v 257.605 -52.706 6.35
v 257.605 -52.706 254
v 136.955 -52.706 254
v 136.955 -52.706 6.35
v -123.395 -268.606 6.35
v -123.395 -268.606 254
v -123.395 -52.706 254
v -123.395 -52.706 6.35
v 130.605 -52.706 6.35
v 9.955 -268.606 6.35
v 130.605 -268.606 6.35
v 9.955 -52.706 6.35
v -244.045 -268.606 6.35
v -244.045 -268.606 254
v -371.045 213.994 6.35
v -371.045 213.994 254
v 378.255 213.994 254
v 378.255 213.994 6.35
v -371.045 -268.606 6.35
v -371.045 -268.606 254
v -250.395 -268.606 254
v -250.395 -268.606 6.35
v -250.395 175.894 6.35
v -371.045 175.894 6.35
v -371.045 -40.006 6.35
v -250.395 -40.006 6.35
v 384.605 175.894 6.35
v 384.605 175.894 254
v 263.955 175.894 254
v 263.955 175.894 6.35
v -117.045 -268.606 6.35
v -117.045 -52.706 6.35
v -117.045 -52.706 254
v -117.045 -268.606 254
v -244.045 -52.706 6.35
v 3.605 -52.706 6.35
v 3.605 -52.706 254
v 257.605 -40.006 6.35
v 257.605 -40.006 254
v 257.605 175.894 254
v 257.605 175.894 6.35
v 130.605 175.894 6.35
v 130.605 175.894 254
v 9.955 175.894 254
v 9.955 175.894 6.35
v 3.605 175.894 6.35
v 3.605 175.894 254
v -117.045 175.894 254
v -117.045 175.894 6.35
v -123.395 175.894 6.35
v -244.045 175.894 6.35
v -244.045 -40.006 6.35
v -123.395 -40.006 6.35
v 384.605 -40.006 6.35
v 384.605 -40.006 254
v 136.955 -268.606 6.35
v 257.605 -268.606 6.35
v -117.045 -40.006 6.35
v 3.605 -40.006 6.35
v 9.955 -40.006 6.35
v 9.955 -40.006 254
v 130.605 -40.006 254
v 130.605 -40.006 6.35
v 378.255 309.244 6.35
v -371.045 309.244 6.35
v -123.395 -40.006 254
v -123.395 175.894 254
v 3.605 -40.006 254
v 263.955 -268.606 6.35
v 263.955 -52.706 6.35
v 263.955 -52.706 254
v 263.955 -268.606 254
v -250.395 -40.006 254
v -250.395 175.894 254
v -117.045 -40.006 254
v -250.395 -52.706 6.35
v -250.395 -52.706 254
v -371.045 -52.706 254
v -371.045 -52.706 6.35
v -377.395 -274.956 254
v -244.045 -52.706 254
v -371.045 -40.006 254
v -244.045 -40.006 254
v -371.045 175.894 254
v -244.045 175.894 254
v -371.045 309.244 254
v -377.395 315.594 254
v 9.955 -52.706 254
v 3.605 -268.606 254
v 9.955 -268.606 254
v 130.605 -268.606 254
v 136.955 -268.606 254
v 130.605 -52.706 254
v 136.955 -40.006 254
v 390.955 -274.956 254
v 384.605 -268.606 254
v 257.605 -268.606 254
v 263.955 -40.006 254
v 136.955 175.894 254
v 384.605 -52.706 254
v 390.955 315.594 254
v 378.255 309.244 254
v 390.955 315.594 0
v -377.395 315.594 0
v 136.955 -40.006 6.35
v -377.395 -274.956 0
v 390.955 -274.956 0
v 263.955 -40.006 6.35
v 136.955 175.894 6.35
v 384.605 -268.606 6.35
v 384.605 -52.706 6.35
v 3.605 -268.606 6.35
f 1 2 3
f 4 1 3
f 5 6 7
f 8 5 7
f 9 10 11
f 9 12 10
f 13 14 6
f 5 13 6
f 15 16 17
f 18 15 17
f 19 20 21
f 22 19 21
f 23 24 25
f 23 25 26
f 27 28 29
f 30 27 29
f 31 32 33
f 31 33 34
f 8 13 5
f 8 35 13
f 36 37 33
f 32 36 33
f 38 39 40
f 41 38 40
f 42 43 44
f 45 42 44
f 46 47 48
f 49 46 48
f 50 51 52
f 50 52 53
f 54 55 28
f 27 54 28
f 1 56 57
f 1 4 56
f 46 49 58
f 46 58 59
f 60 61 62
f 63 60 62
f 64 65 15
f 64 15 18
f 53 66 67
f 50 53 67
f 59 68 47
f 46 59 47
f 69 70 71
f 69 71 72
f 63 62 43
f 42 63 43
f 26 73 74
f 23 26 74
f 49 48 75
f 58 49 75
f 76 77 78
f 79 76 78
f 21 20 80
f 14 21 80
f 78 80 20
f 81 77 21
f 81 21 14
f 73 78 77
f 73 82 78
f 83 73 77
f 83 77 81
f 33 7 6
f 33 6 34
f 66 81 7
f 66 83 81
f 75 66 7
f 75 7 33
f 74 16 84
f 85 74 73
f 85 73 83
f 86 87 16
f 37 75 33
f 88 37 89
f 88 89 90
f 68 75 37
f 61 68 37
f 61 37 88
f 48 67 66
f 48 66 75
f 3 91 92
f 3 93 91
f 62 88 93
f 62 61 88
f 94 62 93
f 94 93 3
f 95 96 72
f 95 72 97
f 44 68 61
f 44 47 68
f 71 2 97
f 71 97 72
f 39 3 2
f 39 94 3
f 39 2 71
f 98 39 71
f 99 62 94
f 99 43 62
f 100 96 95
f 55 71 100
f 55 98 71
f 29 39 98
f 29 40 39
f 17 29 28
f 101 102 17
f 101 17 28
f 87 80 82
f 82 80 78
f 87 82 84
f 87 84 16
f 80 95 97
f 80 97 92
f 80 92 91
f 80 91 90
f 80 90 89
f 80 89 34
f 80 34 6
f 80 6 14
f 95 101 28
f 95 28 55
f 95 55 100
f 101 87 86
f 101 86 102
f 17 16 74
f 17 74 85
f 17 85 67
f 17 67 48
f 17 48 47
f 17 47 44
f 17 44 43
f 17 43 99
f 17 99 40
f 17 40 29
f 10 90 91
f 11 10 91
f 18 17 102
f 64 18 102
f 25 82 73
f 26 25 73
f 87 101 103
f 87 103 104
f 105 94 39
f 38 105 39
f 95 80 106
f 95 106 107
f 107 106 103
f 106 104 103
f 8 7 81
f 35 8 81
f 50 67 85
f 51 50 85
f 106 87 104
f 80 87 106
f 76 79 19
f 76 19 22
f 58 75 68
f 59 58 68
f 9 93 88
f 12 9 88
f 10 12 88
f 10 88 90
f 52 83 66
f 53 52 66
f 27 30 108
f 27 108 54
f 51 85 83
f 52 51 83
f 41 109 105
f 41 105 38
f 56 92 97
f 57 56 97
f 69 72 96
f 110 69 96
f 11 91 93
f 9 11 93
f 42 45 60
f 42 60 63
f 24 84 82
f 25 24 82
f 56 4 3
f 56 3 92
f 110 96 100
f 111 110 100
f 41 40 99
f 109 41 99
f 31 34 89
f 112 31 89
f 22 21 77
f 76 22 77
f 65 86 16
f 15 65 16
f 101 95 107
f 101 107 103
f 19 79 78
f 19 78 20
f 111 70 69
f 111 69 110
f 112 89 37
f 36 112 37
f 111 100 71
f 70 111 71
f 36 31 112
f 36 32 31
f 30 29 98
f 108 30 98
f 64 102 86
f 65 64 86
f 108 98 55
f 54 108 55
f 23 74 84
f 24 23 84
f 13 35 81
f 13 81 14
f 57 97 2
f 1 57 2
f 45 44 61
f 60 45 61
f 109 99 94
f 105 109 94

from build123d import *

# Parameters (mm, degrees)
F0_W     = 762
F0_H     = 584.2
F1_DEPTH = 254
F3_DEPTH = 247.65
F5_DEPTH = 254
F6_DEPTH = 254
F7_DEPTH = 247.65


with BuildPart() as f1:
    # F0 (on Top) → F1 (new body)
    with BuildSketch(Plane.XY):
        with Locations((3.6051012576, 23.4938759938)):
            Rectangle(F0_W, F0_H)
    extrude(amount=F1_DEPTH)

    # F2 (on face) → F3 (cut)
    with BuildSketch(Plane.XY.offset(254)):
        Polygon((-371.0448987424, 309.2438759938), (-371.0448987424, 295.6585884094), (-371.0448987424, 213.9938759938), (378.2551012576, 213.9938759938), (378.2551012576, 277.7049839497), (378.2551012576, 309.2438759938), align=None)
    extrude(amount=-F3_DEPTH, mode=Mode.SUBTRACT)

    # F4 (on face) → F5 (join)
    with BuildSketch(Plane.XY.offset(254)):
        Polygon((384.6051012576, 315.5938759938), (384.6051012576, 175.8938759938), (384.6051012576, -40.0061240062), (384.6051012576, -52.7061240062), (384.6051012576, -268.6061240062), (390.9551012576, -268.6061240062), (390.9551012576, 315.5938759938), align=None)
    extrude(amount=-F5_DEPTH)

    # F4 (on face) → F6 (join)
    with BuildSketch(Plane.XY.offset(254)):
        Polygon((390.9551012576, -268.6061240062), (384.6051012576, -268.6061240062), (263.9551012576, -268.6061240062), (257.6051012576, -268.6061240062), (136.9551012576, -268.6061240062), (130.6051012576, -268.6061240062), (9.9551012576, -268.6061240062), (3.6051012576, -268.6061240062), (-117.0448987424, -268.6061240062), (-123.3948987424, -268.6061240062), (-244.0448987424, -268.6061240062), (-250.3948987424, -268.6061240062), (-371.0448987424, -268.6061240062), (-377.3948987424, -268.6061240062), (-377.3948987424, -274.9561240062), (390.9551012576, -274.9561240062), align=None)
    extrude(amount=-F6_DEPTH)

    # F4 (on face) → F7 (cut)
    with BuildSketch(Plane.XY.offset(254)):
        Polygon((-244.0448987424, -231.7013091296), (-244.0448987424, -268.6061240062), (-123.3948987424, -268.6061240062), (-123.3948987424, -229.8385000676), (-123.3948987424, -52.7061240062), (-244.0448987424, -52.7061240062), align=None)
        Polygon((-117.0448987424, -229.8385000676), (-117.0448987424, -268.6061240062), (3.6051012576, -268.6061240062), (3.6051012576, -232.6196825951), (3.6051012576, -52.7061240062), (-117.0448987424, -52.7061240062), align=None)
        Polygon((9.9551012576, -268.6061240062), (130.6051012576, -268.6061240062), (130.6051012576, -242.5831056088), (130.6051012576, -52.7061240062), (9.9551012576, -52.7061240062), (9.9551012576, -232.6196825951), align=None)
        Polygon((136.9551012576, -268.6061240062), (257.6051012576, -268.6061240062), (257.6051012576, -243.7552756518), (257.6051012576, -52.7061240062), (136.9551012576, -52.7061240062), (136.9551012576, -242.5831056088), align=None)
        Polygon((384.6051012576, -268.6061240062), (384.6051012576, -52.7061240062), (263.9551012576, -52.7061240062), (263.9551012576, -243.7552756518), (263.9551012576, -268.6061240062), align=None)
        Polygon((257.6051012576, 151.0430276394), (257.6051012576, 175.8938759938), (136.9551012576, 175.8938759938), (136.9551012576, 149.8708575964), (136.9551012576, -40.0061240062), (257.6051012576, -40.0061240062), align=None)
        Polygon((130.6051012576, 149.8708575964), (130.6051012576, 175.8938759938), (9.9551012576, 175.8938759938), (9.9551012576, 139.9074345827), (9.9551012576, -40.0061240062), (130.6051012576, -40.0061240062), align=None)
        Polygon((384.6051012576, 175.8938759938), (378.2551012576, 175.8938759938), (263.9551012576, 175.8938759938), (263.9551012576, 151.0430276394), (263.9551012576, -40.0061240062), (384.6051012576, -40.0061240062), align=None)
        Polygon((3.6051012576, 175.8938759938), (-117.0448987424, 175.8938759938), (-117.0448987424, 137.1262520552), (-117.0448987424, -40.0061240062), (3.6051012576, -40.0061240062), (3.6051012576, 139.9074345827), align=None)
        Polygon((-123.3948987424, 175.8938759938), (-244.0448987424, 175.8938759938), (-244.0448987424, 138.9890611172), (-244.0448987424, -40.0061240062), (-123.3948987424, -40.0061240062), (-123.3948987424, 137.1262520552), align=None)
        Polygon((-250.3948987424, 175.8938759938), (-371.0448987424, 175.8938759938), (-371.0448987424, -40.0061240062), (-342.720925808, -40.0061240062), (-250.3948987424, -40.0061240062), (-250.3948987424, 138.9890611172), align=None)
        Polygon((-371.0448987424, -52.7061240062), (-371.0448987424, -268.6061240062), (-250.3948987424, -268.6061240062), (-250.3948987424, -231.7013091296), (-250.3948987424, -52.7061240062), align=None)
    extrude(amount=-F7_DEPTH, mode=Mode.SUBTRACT)


solid = f1.part
